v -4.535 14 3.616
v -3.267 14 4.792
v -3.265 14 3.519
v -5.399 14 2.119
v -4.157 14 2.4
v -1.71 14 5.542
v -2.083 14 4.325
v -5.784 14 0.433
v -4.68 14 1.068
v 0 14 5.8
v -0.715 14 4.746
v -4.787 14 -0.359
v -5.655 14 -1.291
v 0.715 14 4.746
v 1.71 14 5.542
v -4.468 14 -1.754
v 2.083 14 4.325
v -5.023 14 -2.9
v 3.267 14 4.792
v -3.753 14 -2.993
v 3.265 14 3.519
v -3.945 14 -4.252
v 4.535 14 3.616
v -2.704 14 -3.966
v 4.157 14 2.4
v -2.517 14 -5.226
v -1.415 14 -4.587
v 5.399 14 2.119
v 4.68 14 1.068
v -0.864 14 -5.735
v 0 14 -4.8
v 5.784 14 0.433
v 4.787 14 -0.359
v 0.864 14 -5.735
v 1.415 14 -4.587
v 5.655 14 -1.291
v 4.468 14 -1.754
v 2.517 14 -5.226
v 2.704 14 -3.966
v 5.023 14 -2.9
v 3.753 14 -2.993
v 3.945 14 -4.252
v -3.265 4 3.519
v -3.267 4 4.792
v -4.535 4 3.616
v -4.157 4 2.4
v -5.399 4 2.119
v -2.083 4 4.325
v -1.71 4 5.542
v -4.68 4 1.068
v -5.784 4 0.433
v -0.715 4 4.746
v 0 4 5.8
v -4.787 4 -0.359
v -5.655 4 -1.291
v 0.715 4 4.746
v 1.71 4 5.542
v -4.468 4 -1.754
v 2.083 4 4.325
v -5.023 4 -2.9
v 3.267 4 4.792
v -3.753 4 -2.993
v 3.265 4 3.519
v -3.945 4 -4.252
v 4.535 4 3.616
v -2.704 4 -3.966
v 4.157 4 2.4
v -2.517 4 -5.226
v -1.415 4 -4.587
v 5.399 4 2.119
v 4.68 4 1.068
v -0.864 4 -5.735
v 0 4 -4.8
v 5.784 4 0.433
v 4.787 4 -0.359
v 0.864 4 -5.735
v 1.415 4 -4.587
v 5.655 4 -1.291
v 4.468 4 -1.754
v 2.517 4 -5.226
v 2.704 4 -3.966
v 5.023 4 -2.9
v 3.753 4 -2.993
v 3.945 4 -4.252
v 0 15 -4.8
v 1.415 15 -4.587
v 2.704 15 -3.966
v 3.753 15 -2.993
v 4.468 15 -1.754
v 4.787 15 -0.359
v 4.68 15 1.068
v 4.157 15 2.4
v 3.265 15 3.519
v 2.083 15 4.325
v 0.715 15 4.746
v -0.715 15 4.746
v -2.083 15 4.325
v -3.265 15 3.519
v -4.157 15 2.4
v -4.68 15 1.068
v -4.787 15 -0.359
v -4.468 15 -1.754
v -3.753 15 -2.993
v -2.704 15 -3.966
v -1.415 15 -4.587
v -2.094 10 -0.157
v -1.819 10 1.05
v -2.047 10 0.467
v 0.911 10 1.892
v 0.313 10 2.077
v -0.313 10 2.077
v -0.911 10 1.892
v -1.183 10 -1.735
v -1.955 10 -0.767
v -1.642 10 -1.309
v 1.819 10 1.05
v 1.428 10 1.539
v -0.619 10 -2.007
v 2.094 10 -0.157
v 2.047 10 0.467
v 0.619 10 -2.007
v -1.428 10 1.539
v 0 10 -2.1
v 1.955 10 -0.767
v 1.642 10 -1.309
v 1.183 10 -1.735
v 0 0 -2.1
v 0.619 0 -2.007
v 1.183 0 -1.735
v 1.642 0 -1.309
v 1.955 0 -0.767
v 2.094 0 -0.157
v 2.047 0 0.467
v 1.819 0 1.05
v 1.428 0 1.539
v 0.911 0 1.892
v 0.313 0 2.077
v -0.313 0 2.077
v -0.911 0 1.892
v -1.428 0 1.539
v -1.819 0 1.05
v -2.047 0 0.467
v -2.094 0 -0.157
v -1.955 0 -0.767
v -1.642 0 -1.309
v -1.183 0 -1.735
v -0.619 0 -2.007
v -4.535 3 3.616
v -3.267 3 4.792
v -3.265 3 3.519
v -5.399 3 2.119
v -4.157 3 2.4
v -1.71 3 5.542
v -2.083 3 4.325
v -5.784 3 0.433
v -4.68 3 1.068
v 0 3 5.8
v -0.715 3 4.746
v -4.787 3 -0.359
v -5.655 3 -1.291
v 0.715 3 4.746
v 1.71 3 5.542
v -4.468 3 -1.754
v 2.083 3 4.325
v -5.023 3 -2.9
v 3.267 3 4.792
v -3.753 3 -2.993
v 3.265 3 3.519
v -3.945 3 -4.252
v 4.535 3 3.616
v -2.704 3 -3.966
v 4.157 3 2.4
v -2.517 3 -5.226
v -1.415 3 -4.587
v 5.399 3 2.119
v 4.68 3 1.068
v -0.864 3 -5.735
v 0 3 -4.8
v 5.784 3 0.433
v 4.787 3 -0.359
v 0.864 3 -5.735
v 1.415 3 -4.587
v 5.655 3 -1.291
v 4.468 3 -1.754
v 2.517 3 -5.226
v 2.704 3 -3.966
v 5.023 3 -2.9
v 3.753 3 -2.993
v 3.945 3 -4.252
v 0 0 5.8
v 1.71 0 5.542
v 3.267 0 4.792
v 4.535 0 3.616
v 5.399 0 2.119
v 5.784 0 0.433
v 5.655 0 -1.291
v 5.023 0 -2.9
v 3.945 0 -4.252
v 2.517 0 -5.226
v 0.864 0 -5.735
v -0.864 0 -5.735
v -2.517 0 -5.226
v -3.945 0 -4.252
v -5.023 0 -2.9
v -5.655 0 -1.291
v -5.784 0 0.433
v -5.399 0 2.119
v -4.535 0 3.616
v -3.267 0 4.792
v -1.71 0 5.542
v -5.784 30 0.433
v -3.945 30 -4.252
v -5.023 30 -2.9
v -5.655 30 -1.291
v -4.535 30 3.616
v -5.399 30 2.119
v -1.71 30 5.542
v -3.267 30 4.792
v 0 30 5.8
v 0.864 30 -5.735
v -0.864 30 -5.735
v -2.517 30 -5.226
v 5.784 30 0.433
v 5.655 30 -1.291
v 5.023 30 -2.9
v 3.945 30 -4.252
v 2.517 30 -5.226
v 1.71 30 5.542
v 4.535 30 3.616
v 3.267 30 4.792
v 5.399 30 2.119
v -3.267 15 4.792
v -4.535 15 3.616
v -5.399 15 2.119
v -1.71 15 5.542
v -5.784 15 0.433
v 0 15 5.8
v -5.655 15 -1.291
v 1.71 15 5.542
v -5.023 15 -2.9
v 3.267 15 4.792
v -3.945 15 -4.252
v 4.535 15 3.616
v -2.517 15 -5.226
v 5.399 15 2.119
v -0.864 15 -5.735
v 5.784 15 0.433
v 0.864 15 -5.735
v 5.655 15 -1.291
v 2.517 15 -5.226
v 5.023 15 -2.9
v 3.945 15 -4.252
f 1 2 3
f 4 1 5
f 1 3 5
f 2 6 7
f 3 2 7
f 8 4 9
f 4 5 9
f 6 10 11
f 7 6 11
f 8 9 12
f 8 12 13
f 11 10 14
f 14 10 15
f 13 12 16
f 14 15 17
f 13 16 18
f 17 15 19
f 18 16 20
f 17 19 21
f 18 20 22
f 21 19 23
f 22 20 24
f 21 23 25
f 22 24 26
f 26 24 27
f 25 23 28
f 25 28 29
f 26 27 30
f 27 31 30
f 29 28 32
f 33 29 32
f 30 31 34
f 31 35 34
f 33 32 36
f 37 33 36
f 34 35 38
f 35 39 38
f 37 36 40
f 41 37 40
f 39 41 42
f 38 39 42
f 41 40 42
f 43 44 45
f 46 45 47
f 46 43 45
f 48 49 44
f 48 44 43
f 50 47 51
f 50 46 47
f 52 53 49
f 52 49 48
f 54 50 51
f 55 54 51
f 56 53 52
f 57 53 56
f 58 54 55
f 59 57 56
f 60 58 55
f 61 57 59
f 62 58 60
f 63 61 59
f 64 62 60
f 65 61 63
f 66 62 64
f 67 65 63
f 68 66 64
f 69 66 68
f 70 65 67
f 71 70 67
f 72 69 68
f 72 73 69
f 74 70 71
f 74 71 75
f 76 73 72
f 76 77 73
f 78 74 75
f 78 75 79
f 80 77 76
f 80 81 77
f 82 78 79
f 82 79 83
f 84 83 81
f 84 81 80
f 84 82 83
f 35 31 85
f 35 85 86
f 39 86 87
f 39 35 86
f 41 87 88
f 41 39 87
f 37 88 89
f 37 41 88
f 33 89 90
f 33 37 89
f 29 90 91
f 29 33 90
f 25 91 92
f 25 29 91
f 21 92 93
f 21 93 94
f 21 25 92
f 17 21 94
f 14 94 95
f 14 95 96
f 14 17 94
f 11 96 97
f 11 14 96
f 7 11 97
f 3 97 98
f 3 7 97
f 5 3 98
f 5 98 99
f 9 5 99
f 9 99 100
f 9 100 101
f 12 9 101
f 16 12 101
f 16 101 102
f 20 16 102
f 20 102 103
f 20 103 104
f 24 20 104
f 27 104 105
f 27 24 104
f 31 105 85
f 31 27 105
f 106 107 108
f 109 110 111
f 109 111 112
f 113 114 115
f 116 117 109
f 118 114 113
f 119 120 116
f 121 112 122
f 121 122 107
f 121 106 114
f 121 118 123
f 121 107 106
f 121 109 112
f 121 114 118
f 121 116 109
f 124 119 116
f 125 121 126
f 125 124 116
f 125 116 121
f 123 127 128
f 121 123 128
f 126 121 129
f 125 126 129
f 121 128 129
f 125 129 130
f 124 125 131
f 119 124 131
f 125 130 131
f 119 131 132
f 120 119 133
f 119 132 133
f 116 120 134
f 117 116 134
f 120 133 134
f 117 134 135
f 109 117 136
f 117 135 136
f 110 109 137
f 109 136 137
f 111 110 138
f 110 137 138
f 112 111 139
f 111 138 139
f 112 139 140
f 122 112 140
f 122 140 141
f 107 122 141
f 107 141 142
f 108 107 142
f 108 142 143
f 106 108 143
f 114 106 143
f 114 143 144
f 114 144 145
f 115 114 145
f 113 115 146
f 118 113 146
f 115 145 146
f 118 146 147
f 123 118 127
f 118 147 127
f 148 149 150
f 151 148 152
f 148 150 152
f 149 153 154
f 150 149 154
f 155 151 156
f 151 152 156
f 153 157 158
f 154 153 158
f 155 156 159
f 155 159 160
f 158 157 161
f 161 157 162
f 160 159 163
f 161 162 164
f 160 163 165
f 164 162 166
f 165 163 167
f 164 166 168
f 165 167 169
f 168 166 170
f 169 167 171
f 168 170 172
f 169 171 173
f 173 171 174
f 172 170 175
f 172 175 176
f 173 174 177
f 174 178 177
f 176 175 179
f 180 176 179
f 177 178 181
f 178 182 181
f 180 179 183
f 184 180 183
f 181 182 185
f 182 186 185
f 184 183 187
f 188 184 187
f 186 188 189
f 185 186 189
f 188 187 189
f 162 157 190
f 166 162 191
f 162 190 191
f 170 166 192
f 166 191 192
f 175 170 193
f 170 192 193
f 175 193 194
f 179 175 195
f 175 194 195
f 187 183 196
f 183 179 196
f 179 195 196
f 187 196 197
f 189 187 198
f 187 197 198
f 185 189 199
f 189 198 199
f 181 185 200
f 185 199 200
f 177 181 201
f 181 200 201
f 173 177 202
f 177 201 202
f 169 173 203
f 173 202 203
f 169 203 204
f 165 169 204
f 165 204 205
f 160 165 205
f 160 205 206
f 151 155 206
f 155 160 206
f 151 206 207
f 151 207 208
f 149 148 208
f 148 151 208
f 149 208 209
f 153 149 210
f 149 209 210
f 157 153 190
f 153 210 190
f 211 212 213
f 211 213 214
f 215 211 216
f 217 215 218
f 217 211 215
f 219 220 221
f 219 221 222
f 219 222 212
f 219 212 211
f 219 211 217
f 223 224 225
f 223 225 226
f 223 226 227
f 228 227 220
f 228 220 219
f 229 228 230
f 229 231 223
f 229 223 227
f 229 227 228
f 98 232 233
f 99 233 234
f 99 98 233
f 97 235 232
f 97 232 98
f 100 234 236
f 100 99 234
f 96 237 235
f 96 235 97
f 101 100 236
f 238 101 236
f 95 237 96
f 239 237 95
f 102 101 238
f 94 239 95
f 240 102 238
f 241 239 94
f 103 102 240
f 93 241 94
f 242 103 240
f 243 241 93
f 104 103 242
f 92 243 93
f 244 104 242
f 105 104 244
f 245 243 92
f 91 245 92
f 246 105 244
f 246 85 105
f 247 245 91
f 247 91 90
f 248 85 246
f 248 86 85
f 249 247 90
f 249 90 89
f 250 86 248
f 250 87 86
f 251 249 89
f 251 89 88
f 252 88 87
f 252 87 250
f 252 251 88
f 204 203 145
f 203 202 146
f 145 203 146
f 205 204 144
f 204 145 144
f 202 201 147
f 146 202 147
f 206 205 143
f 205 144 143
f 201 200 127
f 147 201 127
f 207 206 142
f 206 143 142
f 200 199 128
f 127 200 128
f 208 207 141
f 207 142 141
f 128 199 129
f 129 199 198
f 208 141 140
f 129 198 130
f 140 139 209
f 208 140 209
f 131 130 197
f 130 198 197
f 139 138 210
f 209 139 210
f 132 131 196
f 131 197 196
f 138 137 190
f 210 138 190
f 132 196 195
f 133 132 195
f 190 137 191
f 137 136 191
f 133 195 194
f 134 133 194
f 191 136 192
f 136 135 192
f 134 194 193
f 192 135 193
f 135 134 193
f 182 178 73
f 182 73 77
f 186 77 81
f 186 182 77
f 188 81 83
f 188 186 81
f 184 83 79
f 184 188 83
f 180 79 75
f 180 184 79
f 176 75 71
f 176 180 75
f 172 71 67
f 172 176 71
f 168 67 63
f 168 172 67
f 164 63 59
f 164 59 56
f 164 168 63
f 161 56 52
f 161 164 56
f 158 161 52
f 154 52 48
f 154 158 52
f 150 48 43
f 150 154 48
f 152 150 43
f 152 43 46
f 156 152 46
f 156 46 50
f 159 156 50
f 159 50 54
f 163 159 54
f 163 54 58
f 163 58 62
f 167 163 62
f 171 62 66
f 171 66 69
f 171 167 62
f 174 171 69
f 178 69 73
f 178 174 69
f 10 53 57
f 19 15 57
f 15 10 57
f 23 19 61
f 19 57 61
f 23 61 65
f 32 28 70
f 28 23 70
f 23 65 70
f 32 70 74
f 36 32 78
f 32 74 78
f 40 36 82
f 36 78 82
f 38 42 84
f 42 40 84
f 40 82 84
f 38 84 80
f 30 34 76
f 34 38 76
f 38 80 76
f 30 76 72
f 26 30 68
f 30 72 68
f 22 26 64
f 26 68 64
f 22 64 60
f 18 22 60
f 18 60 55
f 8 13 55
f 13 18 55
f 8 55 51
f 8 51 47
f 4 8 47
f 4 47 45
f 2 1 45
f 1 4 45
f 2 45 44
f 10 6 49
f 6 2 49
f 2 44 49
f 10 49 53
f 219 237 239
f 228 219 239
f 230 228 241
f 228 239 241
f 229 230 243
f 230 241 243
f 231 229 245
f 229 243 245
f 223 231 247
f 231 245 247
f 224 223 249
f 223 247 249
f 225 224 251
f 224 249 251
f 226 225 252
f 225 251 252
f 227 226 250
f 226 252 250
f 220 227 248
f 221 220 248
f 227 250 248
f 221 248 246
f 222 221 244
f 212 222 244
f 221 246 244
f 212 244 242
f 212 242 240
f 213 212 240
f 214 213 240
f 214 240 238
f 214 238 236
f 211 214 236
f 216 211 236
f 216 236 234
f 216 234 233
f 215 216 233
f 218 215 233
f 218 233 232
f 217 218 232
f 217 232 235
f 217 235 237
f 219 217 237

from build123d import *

# Parameters (mm, degrees)
SKETCH1_R           = 5.8
BOSS_EXTRUDE1_DEPTH = 30
SKETCH2_R           = 2.1
CUT_EXTRUDE1_DEPTH  = 10
SKETCH3_R           = 5.8
SKETCH3_R_2         = 4.8
CUT_EXTRUDE2_DEPTH  = 1
CUT_EXTRUDE3_START  = 1
SKETCH4_R           = 5.8
SKETCH4_R_2         = 4.8
CUT_EXTRUDE3_DEPTH  = 1


with BuildPart() as part:
    # Sketch1 → Boss-Extrude1 (new body)
    with BuildSketch(Plane(origin=(0, 0, 0), x_dir=(1, 0, 0), z_dir=(0, 1, 0))):
        with Locations(Location((0, 0, 0), (0, 0, 270))):
            Circle(SKETCH1_R)
    extrude(amount=BOSS_EXTRUDE1_DEPTH)

    # Sketch2 → Cut-Extrude1 (cut)
    with BuildSketch(Plane.XZ):
        with Locations(Location((0, 0, 0), (0, 0, 270))):
            Circle(SKETCH2_R)
    extrude(amount=-CUT_EXTRUDE1_DEPTH, mode=Mode.SUBTRACT)

    # Sketch3 → Cut-Extrude2 (cut)
    with BuildSketch(Plane(origin=(0, 14, 0), x_dir=(-1, 0, 0), z_dir=(0, -1, 0))):
        with Locations(Location((0, 0, 0), (0, 0, 90))):
            Circle(SKETCH3_R)
        with Locations(Location((0, 0, 0), (0, 0, 90))):
            Circle(SKETCH3_R_2, mode=Mode.SUBTRACT)
    extrude(amount=-CUT_EXTRUDE2_DEPTH, mode=Mode.SUBTRACT)

    # Sketch4 → Cut-Extrude3 (cut)
    with BuildSketch(Plane(origin=(0, 4, 0), x_dir=(-1, 0, 0), z_dir=(0, -1, 0)).offset(CUT_EXTRUDE3_START)):
        with Locations(Location((0, 0, 0), (0, 0, 90))):
            Circle(SKETCH4_R)
        with Locations(Location((0, 0, 0), (0, 0, 90))):
            Circle(SKETCH4_R_2, mode=Mode.SUBTRACT)
    extrude(amount=-CUT_EXTRUDE3_DEPTH, mode=Mode.SUBTRACT)


solid = part.part
